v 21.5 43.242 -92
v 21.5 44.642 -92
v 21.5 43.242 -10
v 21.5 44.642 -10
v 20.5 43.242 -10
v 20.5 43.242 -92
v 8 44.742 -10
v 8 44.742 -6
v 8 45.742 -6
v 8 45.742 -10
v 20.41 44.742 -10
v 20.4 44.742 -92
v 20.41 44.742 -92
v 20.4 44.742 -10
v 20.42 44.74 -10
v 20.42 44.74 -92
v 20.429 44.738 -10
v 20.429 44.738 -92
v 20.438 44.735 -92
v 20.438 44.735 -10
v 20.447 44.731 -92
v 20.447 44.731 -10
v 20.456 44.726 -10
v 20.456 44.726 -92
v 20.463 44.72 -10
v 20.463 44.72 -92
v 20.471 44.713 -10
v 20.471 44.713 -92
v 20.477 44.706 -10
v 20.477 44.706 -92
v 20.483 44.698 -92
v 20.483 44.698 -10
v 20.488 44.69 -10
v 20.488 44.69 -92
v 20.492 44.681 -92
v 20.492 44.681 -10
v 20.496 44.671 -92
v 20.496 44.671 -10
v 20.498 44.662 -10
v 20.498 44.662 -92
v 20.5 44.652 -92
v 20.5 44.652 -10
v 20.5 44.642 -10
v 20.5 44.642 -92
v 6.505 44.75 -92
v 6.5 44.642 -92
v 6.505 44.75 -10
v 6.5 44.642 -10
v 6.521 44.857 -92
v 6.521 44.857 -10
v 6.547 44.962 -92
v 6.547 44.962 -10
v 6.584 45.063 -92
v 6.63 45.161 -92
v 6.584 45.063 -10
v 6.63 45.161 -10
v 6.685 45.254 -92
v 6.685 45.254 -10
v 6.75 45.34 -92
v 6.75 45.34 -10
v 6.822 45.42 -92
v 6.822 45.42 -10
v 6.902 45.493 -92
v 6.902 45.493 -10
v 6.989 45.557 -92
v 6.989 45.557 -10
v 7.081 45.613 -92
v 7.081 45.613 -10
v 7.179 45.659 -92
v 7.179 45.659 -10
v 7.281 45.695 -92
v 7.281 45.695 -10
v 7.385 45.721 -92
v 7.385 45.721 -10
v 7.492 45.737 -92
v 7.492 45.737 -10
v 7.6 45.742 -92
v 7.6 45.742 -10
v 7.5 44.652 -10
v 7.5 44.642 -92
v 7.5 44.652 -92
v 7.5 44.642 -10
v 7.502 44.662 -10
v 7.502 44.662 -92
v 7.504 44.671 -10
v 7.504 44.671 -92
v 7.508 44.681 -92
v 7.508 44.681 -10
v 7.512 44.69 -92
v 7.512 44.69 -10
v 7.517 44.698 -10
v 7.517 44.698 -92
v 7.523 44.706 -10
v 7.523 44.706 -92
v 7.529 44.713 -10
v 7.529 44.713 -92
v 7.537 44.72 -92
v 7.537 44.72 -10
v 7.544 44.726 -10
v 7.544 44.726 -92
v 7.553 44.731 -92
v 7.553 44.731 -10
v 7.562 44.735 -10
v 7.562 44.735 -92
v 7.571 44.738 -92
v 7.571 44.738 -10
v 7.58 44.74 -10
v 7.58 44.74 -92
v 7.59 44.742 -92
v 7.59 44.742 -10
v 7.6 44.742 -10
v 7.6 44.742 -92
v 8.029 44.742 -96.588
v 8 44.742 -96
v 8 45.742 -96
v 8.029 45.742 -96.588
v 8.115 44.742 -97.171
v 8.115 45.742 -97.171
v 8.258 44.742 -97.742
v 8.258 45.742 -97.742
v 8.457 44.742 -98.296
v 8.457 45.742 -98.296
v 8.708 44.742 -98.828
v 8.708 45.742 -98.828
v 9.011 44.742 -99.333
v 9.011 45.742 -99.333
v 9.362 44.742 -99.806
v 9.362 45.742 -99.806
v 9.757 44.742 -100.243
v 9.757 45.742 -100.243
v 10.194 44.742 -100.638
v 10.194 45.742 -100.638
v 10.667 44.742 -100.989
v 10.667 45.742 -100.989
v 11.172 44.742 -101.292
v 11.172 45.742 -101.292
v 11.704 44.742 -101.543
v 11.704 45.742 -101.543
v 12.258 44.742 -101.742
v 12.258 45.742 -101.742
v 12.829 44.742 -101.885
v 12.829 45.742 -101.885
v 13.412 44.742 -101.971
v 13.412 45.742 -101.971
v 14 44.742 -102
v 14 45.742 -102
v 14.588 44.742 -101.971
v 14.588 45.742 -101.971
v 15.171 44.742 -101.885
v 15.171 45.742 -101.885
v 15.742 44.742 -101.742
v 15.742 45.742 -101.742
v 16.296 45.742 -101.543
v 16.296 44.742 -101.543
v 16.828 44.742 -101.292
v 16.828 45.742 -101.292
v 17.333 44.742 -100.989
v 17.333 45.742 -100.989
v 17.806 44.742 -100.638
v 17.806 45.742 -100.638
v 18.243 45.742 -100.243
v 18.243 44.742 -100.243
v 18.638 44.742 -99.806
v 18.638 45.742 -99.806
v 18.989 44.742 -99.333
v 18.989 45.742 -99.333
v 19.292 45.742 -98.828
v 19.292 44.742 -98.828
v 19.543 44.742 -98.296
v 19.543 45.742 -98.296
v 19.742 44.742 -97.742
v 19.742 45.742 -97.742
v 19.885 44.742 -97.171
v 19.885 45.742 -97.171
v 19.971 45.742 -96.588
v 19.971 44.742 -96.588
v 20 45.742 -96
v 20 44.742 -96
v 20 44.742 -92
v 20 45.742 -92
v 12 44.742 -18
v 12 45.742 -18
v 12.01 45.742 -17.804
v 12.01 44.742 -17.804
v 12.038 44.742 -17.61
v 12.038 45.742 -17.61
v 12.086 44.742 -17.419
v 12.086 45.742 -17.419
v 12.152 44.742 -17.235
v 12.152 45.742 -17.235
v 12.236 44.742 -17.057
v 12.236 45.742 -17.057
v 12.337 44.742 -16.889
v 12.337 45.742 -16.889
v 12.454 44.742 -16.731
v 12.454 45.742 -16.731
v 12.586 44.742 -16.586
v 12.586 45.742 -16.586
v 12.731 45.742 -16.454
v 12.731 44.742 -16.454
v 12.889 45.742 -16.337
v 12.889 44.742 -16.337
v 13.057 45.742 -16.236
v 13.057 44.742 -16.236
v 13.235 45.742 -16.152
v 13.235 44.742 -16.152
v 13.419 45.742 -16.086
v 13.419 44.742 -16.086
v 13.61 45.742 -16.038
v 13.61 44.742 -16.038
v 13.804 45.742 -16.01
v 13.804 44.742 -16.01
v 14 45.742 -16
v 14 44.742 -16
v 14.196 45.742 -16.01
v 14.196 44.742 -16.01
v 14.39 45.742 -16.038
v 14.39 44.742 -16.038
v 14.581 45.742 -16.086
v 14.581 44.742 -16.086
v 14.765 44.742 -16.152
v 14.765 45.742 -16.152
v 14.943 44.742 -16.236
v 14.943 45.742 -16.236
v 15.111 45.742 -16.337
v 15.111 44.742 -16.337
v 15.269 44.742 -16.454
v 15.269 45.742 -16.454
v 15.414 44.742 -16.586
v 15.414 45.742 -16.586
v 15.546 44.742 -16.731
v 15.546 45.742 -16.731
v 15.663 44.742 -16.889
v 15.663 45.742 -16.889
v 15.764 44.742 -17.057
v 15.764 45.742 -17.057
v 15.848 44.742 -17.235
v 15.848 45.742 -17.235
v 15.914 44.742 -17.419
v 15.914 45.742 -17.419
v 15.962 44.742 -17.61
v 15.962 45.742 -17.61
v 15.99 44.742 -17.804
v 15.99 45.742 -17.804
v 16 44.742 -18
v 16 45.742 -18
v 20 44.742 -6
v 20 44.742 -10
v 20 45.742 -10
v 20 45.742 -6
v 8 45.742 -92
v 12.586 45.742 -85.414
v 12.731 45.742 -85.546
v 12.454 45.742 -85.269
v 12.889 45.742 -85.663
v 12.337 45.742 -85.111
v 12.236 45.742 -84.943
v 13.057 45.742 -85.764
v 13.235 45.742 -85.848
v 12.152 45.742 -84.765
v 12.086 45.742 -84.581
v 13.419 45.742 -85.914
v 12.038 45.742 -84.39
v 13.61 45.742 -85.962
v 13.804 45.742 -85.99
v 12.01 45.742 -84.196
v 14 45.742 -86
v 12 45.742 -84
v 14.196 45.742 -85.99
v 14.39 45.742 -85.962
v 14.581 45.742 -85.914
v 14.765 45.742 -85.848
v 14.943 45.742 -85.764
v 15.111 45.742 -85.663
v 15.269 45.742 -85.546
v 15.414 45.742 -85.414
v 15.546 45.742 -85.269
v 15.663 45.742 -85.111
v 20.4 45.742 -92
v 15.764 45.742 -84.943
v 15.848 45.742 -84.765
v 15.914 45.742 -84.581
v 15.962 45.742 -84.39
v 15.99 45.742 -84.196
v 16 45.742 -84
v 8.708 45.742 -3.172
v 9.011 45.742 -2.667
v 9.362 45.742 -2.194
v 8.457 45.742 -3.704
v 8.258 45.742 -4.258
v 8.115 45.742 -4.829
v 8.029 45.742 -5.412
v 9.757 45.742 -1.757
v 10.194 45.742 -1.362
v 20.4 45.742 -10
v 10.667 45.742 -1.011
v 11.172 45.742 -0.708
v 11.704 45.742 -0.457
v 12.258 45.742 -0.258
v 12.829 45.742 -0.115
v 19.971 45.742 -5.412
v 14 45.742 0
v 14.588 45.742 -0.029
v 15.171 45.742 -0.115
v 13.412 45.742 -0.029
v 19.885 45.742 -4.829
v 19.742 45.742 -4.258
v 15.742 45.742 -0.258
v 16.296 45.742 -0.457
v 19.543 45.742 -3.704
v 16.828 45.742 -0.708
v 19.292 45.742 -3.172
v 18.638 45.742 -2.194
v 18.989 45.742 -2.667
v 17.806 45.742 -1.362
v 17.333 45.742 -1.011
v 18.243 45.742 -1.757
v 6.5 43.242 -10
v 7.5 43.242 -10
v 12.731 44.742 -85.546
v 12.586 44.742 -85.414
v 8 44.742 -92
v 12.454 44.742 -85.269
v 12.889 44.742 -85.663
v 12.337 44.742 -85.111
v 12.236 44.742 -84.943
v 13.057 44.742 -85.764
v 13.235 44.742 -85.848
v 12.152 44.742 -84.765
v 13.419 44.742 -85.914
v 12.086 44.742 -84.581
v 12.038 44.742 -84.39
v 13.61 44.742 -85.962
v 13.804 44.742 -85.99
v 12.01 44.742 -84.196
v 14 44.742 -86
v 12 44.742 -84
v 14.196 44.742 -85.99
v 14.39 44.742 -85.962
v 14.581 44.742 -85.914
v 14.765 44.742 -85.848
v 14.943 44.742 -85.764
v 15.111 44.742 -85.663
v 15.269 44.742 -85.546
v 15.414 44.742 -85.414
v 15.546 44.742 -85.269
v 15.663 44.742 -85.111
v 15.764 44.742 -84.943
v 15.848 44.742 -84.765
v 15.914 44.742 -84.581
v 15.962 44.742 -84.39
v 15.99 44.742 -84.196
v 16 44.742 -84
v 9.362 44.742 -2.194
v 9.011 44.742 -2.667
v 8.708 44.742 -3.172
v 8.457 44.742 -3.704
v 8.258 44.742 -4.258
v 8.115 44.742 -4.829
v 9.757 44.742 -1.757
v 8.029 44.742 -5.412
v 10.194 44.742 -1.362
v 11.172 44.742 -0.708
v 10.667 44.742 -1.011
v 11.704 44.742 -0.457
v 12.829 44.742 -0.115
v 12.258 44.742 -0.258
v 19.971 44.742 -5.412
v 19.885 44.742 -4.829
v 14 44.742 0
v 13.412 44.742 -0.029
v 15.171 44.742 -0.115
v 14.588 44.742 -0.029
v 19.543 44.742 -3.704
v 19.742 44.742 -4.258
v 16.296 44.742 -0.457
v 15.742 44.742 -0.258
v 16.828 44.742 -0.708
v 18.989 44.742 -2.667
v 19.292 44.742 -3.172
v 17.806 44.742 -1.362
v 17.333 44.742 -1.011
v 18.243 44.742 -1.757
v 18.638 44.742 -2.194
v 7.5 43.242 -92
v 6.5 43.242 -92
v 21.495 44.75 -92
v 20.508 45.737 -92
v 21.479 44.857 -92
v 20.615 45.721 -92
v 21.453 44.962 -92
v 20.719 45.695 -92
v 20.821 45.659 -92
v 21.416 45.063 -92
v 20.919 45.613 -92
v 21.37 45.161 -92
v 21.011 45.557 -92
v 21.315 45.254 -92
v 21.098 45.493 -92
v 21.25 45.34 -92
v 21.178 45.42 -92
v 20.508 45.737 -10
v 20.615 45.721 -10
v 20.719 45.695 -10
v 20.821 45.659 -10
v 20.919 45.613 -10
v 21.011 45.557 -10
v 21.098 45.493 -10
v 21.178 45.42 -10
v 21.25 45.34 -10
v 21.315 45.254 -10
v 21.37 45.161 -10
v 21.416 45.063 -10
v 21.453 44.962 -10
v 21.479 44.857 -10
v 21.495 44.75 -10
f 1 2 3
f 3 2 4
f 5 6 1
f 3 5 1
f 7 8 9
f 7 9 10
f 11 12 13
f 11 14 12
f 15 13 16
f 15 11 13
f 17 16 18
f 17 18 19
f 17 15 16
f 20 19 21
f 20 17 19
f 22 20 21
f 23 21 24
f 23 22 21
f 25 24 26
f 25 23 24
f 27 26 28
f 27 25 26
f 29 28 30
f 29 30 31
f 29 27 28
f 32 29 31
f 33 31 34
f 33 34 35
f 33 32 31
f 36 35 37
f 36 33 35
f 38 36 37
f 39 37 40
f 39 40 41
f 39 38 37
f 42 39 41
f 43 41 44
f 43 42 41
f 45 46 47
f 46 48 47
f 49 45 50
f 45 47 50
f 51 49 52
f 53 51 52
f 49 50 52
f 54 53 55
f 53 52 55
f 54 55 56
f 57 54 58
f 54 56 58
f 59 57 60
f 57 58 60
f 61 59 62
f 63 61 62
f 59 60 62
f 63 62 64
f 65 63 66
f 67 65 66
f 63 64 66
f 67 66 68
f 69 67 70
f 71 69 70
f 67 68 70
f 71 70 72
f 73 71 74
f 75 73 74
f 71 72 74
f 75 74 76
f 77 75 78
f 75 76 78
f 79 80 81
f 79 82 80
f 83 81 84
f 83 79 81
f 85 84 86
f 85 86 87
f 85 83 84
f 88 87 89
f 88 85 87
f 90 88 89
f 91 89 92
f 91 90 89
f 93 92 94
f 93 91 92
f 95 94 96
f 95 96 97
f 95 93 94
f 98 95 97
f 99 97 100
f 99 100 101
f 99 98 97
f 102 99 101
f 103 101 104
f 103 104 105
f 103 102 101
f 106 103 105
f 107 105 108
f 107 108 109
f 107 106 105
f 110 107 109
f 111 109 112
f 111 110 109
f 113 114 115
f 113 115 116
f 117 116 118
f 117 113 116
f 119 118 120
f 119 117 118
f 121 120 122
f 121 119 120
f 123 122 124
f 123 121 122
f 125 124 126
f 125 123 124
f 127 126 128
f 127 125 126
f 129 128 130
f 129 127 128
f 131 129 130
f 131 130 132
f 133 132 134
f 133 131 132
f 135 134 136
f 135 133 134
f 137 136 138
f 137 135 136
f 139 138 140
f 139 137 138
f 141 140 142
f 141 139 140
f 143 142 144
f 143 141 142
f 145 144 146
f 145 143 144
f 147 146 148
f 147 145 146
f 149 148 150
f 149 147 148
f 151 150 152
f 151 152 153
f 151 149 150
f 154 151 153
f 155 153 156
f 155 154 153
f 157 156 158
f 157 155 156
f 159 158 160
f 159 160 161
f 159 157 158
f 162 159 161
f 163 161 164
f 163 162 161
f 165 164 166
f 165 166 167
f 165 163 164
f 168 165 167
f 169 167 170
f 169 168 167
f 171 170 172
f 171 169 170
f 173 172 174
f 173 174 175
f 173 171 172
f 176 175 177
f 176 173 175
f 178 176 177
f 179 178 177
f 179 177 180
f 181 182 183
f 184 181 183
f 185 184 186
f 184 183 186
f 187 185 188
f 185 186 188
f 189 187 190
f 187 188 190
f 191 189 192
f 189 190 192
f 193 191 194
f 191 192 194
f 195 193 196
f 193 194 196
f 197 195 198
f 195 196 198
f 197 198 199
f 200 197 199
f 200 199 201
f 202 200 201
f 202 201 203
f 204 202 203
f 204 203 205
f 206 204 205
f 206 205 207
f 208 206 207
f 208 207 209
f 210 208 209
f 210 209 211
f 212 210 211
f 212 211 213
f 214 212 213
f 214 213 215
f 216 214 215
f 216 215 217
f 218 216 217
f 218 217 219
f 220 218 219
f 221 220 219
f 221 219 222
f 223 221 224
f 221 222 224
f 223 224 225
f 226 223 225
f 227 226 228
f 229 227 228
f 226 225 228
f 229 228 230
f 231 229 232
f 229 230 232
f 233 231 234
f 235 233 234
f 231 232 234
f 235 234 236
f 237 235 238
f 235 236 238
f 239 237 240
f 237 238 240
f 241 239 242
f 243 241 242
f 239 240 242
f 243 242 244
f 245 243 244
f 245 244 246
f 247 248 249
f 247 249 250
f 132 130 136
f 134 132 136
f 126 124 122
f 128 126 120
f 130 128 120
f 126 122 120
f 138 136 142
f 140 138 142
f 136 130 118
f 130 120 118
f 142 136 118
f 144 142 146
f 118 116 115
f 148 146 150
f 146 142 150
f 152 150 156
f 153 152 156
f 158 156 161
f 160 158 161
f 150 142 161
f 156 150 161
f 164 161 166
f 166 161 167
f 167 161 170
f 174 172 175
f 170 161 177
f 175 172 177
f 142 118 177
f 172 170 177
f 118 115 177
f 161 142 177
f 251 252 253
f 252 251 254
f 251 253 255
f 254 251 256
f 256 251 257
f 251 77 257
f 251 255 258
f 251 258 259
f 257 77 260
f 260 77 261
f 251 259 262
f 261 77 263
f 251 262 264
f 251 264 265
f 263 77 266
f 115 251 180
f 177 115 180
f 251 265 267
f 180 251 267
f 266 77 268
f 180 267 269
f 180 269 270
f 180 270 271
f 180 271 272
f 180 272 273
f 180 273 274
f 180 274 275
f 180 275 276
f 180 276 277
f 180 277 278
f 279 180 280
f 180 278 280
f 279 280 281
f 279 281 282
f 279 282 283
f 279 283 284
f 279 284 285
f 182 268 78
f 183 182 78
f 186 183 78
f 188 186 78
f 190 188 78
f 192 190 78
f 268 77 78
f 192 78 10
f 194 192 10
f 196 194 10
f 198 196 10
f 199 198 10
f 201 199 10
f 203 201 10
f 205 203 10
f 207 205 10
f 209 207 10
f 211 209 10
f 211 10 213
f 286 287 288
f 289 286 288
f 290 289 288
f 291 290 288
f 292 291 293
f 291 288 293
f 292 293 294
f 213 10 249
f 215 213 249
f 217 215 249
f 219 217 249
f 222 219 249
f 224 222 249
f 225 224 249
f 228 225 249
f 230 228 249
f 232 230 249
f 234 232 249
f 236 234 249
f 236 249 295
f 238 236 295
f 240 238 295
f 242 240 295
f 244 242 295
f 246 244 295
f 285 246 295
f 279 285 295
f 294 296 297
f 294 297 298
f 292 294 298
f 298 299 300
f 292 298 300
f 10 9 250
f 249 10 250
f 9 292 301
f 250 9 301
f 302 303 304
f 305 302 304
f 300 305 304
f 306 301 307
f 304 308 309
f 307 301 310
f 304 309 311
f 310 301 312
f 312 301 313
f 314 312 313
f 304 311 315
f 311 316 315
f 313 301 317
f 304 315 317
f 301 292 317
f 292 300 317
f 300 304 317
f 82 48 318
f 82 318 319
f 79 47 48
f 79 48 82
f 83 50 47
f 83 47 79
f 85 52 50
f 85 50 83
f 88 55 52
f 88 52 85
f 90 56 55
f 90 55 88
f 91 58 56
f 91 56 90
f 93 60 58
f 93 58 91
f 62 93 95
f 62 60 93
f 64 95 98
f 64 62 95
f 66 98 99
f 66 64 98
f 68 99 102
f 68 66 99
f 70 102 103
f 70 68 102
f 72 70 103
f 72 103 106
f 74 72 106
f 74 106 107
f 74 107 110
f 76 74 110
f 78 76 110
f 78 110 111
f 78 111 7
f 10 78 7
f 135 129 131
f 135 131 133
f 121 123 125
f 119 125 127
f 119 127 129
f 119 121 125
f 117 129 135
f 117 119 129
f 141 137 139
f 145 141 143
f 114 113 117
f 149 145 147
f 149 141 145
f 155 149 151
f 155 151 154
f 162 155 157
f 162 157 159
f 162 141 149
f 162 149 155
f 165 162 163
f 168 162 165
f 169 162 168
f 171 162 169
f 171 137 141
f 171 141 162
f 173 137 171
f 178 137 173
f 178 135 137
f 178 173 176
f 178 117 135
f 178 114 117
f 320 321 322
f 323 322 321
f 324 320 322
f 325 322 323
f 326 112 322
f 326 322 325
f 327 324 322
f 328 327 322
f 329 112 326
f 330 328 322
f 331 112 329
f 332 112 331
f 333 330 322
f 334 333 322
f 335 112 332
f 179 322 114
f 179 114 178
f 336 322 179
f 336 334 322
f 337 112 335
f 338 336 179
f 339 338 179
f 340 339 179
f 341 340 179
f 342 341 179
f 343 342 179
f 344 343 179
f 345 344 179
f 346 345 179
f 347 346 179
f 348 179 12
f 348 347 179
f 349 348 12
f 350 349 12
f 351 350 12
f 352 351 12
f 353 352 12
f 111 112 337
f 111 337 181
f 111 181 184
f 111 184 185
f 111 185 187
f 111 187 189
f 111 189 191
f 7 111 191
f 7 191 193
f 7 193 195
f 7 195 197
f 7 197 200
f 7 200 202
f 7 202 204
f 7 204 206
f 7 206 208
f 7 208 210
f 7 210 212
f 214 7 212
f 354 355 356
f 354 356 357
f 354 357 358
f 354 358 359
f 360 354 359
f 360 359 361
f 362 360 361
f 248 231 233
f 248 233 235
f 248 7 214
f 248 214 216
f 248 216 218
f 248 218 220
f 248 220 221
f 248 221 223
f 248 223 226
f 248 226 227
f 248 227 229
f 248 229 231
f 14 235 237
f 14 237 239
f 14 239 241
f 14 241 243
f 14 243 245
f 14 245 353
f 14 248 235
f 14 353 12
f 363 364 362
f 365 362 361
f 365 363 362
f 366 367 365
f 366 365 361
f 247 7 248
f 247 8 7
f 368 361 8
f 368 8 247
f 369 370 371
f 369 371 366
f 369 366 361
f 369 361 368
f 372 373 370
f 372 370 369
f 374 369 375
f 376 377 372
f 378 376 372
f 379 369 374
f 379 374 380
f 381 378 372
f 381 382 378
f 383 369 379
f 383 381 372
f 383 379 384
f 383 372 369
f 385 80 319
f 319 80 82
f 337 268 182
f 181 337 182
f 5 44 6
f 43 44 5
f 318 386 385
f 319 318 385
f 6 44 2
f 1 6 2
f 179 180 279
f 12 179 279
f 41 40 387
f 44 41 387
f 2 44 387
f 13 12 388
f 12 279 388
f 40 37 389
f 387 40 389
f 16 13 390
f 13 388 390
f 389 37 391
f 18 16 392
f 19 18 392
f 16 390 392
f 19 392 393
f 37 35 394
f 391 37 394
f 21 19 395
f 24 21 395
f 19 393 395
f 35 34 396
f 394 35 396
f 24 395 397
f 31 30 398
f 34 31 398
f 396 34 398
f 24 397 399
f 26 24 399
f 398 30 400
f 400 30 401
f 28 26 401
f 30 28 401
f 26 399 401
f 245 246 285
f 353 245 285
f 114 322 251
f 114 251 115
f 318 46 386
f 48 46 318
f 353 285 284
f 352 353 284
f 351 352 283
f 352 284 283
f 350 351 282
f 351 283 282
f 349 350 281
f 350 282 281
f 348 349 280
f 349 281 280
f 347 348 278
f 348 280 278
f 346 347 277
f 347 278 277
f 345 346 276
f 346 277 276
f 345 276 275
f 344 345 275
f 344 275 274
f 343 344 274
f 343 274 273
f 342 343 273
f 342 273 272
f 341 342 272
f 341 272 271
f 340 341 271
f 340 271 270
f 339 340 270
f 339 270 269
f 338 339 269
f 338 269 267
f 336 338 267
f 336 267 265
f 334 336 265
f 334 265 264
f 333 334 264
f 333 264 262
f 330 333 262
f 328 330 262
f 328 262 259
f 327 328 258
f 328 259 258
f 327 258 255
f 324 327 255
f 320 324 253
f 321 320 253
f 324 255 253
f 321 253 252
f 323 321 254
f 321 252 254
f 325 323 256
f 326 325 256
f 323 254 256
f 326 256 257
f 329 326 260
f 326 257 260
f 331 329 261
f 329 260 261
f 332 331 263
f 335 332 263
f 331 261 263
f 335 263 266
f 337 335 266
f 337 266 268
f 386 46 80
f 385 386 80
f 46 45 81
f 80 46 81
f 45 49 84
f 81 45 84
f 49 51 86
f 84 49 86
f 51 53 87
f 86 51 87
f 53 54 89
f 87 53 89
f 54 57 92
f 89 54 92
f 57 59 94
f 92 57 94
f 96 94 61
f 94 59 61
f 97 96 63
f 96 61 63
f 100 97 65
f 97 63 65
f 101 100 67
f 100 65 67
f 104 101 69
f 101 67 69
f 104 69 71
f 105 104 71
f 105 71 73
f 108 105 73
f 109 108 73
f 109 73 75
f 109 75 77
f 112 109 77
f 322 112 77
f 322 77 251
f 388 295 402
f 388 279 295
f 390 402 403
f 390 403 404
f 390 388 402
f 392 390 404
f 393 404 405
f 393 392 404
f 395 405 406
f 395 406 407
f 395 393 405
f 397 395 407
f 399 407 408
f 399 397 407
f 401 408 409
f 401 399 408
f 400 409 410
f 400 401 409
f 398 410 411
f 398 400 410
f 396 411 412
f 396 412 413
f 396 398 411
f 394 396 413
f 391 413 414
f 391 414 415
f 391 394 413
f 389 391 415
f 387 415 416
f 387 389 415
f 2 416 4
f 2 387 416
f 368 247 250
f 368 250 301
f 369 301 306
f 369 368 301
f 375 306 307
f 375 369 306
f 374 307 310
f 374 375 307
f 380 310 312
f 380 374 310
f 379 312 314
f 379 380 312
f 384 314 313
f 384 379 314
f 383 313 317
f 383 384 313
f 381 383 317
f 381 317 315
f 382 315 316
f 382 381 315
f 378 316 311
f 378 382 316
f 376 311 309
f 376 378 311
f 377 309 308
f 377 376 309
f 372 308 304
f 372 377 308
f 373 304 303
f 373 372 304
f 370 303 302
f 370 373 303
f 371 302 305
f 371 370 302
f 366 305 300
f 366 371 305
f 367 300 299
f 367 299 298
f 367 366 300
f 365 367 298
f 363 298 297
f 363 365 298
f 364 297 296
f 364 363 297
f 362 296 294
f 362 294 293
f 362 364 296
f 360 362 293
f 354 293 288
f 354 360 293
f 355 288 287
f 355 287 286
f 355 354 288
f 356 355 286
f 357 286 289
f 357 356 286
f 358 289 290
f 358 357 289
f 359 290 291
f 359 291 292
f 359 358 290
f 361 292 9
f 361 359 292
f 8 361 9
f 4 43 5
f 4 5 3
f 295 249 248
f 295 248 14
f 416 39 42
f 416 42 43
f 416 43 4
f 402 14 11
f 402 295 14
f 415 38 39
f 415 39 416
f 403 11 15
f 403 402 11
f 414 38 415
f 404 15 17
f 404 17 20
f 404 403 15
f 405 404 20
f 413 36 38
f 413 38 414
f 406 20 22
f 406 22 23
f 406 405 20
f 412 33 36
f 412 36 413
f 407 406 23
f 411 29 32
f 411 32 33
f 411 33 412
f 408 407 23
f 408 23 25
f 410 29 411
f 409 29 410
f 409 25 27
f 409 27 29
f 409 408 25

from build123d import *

# Parameters (mm, degrees)
SALIENTE_EXTRUIR1_DEPTH = 1
CROQUIS2_W              = 82
CROQUIS2_H              = 1
SALIENTE_EXTRUIR2_DEPTH = 1.5
CROQUIS3_W              = 1
CROQUIS3_H              = 82
SALIENTE_EXTRUIR3_DEPTH = 1.5
CROQUIS4_W              = 82
CROQUIS4_H              = 1
SALIENTE_EXTRUIR4_DEPTH = 1.5
CROQUIS5_W              = 1
CROQUIS5_H              = 82
SALIENTE_EXTRUIR5_DEPTH = 1.5
CORTAR_EXTRUIR1_DEPTH   = 105.271280802
REDONDEO1_R             = 0.1
REDONDEO2_R             = 1.1


with BuildPart() as part:
    # Croquis1 → Saliente-Extruir1 (new body)
    with BuildSketch(Plane.XZ.offset(-44.742417107)):
        with BuildLine():
            Line((20, -96), (20, -6))
            ThreePointArc((20, -6), (14, 0), (8, -6))
            Line((8, -6), (8, -96))
            ThreePointArc((8, -96), (14, -102), (20, -96))
        make_face()
    extrude(amount=-SALIENTE_EXTRUIR1_DEPTH)

    # Croquis2 → Saliente-Extruir2 (add)
    with BuildSketch(Plane(origin=(20, 0, 0), x_dir=(0, 0, -1), z_dir=(1, 0, 0))):
        with Locations((51, 45.242417107)):
            Rectangle(CROQUIS2_W, CROQUIS2_H)
    extrude(amount=SALIENTE_EXTRUIR2_DEPTH)

    # Croquis3 → Saliente-Extruir3 (add)
    with BuildSketch(Plane.XZ.offset(-44.742417107)):
        with Locations((21, -51)):
            Rectangle(CROQUIS3_W, CROQUIS3_H)
    extrude(amount=SALIENTE_EXTRUIR3_DEPTH)

    # Croquis4 → Saliente-Extruir4 (add)
    with BuildSketch(Plane.ZY.offset(-8)):
        with Locations((-51, 45.242417107)):
            Rectangle(CROQUIS4_W, CROQUIS4_H)
    extrude(amount=SALIENTE_EXTRUIR4_DEPTH)

    # Croquis5 → Saliente-Extruir5 (add)
    with BuildSketch(Plane.XZ.offset(-44.742417107)):
        with Locations((7, -51)):
            Rectangle(CROQUIS5_W, CROQUIS5_H)
    extrude(amount=SALIENTE_EXTRUIR5_DEPTH)

    # Croquis6 → Cortar-Extruir1 (cut, through all)
    with BuildSketch(Plane(origin=(0, 45.742417107, 0), x_dir=(-1, 0, 0), z_dir=(0, 1, 0))):
        with BuildLine():
            Line((-12, -84), (-12, -18))
            ThreePointArc((-12, -18), (-14, -16), (-16, -18))
            Line((-16, -18), (-16, -84))
            ThreePointArc((-16, -84), (-14, -86), (-12, -84))
        make_face()
    extrude(amount=-CORTAR_EXTRUIR1_DEPTH, mode=Mode.SUBTRACT)

    # Redondeo1
    redondeo1_edges = [part.edges().sort_by_distance(p)[0] for p in [
        (20.5, 44.742417107, -51),
        (7.5, 44.742417107, -51),
    ]]
    fillet(redondeo1_edges, radius=REDONDEO1_R)

    # Redondeo2
    redondeo2_edges = [part.edges().sort_by_distance(p)[0] for p in [
        (21.5, 45.742417107, -51),
        (6.5, 45.742417107, -51),
    ]]
    fillet(redondeo2_edges, radius=REDONDEO2_R)


solid = part.part
